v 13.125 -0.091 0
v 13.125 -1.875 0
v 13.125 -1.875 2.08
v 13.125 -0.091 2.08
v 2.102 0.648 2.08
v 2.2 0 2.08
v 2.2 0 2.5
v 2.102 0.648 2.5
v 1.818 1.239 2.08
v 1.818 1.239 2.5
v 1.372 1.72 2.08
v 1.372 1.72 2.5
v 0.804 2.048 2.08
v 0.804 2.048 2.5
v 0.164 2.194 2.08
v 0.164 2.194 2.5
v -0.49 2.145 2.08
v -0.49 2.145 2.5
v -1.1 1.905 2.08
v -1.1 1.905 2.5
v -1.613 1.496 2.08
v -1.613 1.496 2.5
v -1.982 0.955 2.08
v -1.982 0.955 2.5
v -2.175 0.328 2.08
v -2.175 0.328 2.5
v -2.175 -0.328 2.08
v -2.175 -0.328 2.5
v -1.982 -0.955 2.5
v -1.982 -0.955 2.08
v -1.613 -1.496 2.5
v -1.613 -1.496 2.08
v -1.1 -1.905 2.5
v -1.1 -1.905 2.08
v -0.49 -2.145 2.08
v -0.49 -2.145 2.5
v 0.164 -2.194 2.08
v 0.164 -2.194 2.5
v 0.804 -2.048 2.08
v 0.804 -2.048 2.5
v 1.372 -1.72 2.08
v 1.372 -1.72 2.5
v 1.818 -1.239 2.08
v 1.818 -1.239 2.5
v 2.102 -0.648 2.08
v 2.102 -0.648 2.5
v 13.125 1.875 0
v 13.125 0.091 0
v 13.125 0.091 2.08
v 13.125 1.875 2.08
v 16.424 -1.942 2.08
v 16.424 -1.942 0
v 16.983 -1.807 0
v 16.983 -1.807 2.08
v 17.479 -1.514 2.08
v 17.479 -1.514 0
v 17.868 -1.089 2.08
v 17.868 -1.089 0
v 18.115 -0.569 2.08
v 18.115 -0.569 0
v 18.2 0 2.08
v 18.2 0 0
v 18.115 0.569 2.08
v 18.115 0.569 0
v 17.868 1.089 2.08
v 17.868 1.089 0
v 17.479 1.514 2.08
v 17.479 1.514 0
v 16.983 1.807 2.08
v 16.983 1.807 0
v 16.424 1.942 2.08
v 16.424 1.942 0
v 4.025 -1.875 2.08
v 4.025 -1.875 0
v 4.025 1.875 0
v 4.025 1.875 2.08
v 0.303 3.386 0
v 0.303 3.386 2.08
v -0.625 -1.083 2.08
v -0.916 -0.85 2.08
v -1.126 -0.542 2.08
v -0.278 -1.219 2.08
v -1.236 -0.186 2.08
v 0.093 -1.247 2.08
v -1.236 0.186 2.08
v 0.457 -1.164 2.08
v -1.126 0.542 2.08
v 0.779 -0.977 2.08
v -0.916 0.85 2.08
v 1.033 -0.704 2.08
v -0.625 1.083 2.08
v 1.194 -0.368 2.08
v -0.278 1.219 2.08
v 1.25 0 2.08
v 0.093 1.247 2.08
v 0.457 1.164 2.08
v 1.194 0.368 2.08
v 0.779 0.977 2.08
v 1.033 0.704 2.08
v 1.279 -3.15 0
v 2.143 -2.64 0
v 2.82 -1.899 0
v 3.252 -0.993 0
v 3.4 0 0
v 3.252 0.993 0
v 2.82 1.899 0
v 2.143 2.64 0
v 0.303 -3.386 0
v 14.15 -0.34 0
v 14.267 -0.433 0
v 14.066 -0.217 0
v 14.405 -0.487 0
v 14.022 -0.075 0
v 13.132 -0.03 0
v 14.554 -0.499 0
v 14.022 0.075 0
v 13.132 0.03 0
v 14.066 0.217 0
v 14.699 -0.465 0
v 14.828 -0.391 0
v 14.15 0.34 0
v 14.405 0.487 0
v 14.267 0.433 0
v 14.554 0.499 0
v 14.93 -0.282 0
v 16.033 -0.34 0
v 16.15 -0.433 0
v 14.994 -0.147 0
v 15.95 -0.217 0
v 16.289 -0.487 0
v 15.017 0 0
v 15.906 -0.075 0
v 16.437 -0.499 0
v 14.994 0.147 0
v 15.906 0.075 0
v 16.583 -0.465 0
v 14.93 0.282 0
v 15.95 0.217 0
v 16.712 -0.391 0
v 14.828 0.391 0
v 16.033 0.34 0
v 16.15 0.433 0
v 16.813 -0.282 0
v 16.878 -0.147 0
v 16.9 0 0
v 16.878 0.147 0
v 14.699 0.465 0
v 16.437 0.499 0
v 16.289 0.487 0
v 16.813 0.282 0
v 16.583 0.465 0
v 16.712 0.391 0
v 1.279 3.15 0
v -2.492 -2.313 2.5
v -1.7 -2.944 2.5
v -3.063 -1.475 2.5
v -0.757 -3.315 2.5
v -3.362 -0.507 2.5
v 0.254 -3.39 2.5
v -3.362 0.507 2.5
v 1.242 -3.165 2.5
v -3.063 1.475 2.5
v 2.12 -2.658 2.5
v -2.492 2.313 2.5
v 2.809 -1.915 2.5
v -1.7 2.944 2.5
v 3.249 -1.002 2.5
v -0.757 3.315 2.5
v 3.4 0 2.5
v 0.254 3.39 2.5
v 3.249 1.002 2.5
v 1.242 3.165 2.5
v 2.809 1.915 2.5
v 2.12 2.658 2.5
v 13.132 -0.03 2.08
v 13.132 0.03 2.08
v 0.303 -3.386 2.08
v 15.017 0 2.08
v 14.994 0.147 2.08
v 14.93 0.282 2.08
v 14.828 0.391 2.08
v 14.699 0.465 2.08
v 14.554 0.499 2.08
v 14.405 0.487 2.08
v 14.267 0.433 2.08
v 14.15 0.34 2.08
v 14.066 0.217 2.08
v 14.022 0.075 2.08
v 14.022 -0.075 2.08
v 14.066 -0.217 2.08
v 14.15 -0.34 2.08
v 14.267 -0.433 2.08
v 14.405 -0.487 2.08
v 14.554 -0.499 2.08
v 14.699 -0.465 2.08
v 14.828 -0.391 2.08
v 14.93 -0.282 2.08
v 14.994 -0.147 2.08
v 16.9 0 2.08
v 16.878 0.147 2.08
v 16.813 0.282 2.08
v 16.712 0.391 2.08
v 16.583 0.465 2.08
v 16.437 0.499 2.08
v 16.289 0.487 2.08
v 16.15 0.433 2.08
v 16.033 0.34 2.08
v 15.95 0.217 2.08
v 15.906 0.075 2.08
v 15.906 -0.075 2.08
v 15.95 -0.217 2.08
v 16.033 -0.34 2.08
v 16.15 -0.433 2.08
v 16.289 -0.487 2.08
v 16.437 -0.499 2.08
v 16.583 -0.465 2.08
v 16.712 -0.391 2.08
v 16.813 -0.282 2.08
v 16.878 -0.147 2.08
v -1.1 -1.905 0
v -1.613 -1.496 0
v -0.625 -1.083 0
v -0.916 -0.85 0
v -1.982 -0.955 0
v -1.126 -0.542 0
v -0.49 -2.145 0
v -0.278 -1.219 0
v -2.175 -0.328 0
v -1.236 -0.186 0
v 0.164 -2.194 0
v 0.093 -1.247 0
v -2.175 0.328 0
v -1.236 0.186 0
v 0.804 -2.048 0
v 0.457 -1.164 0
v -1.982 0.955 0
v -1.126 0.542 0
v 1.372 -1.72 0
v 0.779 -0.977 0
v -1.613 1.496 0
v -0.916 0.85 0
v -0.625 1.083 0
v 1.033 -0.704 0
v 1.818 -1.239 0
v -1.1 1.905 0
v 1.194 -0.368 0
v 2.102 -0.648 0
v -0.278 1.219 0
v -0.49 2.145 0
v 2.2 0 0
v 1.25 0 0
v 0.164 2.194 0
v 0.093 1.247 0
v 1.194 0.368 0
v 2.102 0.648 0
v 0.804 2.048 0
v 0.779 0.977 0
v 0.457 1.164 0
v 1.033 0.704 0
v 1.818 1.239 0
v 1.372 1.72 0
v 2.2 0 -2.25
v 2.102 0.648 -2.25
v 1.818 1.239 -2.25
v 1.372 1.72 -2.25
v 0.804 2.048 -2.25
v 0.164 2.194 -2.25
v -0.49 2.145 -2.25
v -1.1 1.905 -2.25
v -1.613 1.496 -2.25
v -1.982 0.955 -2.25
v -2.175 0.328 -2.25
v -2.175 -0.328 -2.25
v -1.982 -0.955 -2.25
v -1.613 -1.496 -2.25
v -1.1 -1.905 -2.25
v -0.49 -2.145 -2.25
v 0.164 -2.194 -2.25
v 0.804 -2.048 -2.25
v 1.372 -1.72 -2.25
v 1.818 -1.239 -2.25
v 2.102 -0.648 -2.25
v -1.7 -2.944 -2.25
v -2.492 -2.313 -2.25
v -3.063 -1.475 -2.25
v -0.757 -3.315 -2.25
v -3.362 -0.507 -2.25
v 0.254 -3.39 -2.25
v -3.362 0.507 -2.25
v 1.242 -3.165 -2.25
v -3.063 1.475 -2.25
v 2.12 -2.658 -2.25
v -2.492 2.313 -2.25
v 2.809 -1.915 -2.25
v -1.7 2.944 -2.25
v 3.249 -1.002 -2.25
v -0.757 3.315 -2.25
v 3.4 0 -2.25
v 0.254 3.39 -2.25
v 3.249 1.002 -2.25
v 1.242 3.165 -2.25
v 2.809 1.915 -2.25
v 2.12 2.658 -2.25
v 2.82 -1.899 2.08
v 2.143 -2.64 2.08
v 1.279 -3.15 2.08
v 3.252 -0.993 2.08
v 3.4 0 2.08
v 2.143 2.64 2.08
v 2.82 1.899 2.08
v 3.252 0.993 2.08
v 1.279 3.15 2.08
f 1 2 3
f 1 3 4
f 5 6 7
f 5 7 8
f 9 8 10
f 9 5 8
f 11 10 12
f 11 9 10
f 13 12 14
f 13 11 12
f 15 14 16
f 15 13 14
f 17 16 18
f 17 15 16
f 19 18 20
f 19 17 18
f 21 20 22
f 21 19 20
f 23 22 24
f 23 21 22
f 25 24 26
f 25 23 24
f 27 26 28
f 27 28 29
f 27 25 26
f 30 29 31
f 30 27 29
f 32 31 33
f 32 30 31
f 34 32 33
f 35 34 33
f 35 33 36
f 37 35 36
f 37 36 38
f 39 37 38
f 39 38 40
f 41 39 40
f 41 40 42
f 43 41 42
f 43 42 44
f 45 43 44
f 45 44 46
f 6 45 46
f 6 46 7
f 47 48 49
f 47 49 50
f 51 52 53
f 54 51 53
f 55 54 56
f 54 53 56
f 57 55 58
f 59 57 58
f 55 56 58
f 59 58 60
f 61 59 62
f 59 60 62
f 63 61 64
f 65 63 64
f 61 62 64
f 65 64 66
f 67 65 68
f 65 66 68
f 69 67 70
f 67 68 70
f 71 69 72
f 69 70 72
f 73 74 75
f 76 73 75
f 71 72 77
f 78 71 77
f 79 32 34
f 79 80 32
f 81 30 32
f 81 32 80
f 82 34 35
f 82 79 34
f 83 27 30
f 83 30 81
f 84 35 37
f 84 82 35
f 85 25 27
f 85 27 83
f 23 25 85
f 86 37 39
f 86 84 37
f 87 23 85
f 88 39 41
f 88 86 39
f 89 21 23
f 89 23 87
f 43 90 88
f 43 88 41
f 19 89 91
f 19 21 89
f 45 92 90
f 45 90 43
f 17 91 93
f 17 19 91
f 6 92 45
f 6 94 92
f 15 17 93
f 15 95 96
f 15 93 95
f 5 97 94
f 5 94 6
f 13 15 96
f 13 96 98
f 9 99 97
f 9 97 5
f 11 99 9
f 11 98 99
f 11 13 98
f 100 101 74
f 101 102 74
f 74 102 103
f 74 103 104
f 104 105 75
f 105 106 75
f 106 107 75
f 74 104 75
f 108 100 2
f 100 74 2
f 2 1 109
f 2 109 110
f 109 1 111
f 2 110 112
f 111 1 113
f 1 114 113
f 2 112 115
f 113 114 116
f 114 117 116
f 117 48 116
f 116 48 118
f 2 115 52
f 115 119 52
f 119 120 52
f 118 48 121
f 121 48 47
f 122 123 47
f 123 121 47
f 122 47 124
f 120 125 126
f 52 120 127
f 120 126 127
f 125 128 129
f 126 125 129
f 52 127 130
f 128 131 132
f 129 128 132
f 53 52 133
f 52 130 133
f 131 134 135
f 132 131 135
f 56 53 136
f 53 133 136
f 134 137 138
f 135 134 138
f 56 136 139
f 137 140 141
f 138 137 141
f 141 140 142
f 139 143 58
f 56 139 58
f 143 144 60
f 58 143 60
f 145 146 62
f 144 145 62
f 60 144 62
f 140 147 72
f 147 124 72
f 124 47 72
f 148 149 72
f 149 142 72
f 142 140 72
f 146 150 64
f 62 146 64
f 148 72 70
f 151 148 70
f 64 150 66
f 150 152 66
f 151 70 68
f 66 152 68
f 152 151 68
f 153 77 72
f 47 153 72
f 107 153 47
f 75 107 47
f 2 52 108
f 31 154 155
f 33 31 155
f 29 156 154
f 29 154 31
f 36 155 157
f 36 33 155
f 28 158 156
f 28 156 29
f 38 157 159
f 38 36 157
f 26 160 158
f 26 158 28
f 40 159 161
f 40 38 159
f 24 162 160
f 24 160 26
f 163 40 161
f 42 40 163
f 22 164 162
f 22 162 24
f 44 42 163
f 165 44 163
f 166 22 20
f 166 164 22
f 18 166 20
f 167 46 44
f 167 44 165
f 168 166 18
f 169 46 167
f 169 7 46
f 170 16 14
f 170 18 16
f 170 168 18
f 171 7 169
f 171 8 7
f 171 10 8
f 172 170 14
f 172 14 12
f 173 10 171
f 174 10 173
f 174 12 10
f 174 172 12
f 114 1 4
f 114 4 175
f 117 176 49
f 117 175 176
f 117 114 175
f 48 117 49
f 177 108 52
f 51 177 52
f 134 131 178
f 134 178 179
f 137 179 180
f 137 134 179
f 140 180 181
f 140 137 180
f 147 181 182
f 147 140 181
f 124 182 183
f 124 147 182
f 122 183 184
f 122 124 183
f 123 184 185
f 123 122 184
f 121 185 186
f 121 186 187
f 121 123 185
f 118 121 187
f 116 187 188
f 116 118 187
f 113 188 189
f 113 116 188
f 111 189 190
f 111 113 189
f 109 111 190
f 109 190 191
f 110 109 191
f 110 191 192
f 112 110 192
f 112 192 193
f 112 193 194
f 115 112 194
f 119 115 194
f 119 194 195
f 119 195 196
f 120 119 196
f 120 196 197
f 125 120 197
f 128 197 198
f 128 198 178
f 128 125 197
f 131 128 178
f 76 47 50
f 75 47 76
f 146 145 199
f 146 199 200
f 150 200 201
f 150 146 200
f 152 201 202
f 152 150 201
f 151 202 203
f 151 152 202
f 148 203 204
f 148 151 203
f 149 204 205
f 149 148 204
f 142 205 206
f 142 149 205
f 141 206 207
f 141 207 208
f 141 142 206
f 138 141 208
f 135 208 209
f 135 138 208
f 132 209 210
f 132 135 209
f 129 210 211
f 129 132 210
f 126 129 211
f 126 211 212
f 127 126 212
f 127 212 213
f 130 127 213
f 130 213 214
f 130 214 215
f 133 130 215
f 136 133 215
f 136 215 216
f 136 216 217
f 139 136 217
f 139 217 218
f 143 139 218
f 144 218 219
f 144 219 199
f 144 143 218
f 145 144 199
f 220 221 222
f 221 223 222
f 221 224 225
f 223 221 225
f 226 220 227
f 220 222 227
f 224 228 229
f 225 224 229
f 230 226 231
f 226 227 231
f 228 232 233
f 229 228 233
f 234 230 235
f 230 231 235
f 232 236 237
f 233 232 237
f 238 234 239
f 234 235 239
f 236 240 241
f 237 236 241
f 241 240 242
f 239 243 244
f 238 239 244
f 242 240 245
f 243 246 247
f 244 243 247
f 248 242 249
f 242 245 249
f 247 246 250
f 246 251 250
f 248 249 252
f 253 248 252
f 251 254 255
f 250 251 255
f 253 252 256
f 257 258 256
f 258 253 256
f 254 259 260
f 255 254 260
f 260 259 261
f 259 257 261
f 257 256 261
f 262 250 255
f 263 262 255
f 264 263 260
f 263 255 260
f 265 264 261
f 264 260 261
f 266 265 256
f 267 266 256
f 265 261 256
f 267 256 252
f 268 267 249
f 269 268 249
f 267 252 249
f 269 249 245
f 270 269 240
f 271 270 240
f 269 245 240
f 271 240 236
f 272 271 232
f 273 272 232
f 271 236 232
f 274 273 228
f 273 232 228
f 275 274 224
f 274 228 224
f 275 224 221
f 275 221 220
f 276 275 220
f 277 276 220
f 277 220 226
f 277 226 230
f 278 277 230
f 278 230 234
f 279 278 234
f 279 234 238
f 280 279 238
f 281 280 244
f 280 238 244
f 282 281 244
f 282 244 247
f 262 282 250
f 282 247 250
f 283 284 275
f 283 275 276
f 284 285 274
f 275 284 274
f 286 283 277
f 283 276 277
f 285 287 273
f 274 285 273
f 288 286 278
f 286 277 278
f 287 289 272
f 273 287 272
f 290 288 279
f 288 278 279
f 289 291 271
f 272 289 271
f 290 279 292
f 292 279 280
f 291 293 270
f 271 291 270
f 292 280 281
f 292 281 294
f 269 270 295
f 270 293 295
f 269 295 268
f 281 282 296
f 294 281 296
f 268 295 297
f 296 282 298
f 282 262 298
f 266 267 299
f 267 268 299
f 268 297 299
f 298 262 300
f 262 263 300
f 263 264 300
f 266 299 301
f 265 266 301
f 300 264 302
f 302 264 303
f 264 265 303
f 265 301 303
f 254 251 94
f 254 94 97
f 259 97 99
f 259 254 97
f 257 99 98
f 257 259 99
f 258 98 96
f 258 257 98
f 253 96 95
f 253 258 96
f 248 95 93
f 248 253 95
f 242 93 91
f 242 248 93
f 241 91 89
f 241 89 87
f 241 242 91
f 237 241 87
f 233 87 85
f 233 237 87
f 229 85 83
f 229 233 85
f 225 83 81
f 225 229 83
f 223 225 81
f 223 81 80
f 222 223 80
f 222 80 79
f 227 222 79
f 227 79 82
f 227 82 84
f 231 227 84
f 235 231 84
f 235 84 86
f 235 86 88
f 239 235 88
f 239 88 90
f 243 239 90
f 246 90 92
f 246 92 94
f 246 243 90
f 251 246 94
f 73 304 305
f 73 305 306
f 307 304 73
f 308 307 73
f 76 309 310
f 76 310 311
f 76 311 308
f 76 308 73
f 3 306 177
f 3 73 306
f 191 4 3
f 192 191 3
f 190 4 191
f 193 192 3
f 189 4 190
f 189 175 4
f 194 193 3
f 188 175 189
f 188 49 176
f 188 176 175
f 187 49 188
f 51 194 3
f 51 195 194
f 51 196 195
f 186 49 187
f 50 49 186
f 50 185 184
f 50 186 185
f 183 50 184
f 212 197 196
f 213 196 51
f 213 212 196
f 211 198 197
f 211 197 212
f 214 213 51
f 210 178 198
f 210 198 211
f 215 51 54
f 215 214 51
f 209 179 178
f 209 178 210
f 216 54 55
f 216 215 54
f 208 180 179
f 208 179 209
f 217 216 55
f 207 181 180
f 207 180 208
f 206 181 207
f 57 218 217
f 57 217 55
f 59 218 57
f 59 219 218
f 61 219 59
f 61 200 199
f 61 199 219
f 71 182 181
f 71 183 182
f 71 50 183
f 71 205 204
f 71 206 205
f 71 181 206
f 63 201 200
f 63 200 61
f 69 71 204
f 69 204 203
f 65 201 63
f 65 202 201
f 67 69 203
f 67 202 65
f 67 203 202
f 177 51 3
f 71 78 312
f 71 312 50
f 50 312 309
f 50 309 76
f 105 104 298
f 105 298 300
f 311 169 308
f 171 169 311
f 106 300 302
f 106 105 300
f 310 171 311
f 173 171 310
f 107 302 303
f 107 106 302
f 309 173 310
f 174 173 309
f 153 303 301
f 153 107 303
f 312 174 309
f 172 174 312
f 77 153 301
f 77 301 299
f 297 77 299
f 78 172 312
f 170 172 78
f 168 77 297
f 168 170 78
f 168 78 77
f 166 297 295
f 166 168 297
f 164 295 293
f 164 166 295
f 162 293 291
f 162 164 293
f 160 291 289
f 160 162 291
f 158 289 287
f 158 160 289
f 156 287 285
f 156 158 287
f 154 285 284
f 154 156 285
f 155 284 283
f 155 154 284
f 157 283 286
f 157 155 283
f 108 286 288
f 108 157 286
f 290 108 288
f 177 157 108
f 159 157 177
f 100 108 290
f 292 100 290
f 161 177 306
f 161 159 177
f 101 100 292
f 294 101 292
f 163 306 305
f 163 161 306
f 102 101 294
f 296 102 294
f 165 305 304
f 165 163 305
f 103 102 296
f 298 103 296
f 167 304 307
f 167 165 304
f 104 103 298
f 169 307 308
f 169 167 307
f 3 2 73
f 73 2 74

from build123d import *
from build123d.topology import SkipClean

# Parameters (mm, degrees)
SKETCH1_R               = 0.5
SKETCH1_R_2             = 1.25
BASE_DEPTH              = 2.08
CONNECTION_DEPTH        = 2.5
CONNECTION_DEPTH_BACK   = 2.25
SKETCH1_3_R             = 2.2
SKETCH2_W               = 9.1
SKETCH2_H               = 3.75
ALIGNMENT_CHANNEL_DEPTH = 10


with BuildPart() as part:
    # Sketch1 → Base (new body)
    with BuildSketch(Plane.XY):
        with BuildLine():
            ThreePointArc((16.424, -1.942221409), (18.2, 0), (16.424, 1.942221409))
            Line((16.424, 1.942221409), (0.303384615, 3.386437328))
            ThreePointArc((0.303384615, 3.386437328), (-3.4, 0), (0.303384615, -3.386437328))
            Line((0.303384615, -3.386437328), (16.424, -1.942221409))
        make_face()
        with Locations((5.1, 0)):
            Circle(SKETCH1_R, mode=Mode.SUBTRACT)
        with Locations((6.983333333, 0)):
            Circle(SKETCH1_R, mode=Mode.SUBTRACT)
        with Locations((8.866666667, 0)):
            Circle(SKETCH1_R, mode=Mode.SUBTRACT)
        with Locations((10.75, 0)):
            Circle(SKETCH1_R, mode=Mode.SUBTRACT)
        with Locations((12.633333333, 0)):
            Circle(SKETCH1_R, mode=Mode.SUBTRACT)
        with Locations((14.516666667, 0)):
            Circle(SKETCH1_R, mode=Mode.SUBTRACT)
        with Locations((16.4, 0)):
            Circle(SKETCH1_R, mode=Mode.SUBTRACT)
        Circle(SKETCH1_R_2, mode=Mode.SUBTRACT)
    extrude(amount=BASE_DEPTH)

    # Sketch1<3> → Connection (add, two sides: drawn at the far end of the back side and taken through both)
    with SkipClean():  # the faces are left unmerged after this step: merging them gives an invalid solid
        with BuildSketch(Plane.XY.offset(-CONNECTION_DEPTH_BACK)):
            with BuildLine():
                ThreePointArc((3.4, 0), (2.509134083, 2.294394507), (0.303384615, 3.386437328))
                ThreePointArc((0.303384615, 3.386437328), (-3.4, 0), (0.303384615, -3.386437328))
                ThreePointArc((0.303384615, -3.386437328), (2.509134083, -2.294394507), (3.4, 0))
            make_face()
            Circle(SKETCH1_3_R, mode=Mode.SUBTRACT)
        extrude(amount=CONNECTION_DEPTH + CONNECTION_DEPTH_BACK)

    # Sketch2 → Alignment channel (cut)
    with SkipClean():  # the faces are left unmerged after this step: merging them gives an invalid solid
        with BuildSketch(Plane(origin=(0, 0, 0), x_dir=(-1, 0, 0), z_dir=(0, 0, -1))):
            with Locations((-8.575, 0)):
                Rectangle(SKETCH2_W, SKETCH2_H)
        extrude(amount=-ALIGNMENT_CHANNEL_DEPTH, mode=Mode.SUBTRACT)


solid = part.part
